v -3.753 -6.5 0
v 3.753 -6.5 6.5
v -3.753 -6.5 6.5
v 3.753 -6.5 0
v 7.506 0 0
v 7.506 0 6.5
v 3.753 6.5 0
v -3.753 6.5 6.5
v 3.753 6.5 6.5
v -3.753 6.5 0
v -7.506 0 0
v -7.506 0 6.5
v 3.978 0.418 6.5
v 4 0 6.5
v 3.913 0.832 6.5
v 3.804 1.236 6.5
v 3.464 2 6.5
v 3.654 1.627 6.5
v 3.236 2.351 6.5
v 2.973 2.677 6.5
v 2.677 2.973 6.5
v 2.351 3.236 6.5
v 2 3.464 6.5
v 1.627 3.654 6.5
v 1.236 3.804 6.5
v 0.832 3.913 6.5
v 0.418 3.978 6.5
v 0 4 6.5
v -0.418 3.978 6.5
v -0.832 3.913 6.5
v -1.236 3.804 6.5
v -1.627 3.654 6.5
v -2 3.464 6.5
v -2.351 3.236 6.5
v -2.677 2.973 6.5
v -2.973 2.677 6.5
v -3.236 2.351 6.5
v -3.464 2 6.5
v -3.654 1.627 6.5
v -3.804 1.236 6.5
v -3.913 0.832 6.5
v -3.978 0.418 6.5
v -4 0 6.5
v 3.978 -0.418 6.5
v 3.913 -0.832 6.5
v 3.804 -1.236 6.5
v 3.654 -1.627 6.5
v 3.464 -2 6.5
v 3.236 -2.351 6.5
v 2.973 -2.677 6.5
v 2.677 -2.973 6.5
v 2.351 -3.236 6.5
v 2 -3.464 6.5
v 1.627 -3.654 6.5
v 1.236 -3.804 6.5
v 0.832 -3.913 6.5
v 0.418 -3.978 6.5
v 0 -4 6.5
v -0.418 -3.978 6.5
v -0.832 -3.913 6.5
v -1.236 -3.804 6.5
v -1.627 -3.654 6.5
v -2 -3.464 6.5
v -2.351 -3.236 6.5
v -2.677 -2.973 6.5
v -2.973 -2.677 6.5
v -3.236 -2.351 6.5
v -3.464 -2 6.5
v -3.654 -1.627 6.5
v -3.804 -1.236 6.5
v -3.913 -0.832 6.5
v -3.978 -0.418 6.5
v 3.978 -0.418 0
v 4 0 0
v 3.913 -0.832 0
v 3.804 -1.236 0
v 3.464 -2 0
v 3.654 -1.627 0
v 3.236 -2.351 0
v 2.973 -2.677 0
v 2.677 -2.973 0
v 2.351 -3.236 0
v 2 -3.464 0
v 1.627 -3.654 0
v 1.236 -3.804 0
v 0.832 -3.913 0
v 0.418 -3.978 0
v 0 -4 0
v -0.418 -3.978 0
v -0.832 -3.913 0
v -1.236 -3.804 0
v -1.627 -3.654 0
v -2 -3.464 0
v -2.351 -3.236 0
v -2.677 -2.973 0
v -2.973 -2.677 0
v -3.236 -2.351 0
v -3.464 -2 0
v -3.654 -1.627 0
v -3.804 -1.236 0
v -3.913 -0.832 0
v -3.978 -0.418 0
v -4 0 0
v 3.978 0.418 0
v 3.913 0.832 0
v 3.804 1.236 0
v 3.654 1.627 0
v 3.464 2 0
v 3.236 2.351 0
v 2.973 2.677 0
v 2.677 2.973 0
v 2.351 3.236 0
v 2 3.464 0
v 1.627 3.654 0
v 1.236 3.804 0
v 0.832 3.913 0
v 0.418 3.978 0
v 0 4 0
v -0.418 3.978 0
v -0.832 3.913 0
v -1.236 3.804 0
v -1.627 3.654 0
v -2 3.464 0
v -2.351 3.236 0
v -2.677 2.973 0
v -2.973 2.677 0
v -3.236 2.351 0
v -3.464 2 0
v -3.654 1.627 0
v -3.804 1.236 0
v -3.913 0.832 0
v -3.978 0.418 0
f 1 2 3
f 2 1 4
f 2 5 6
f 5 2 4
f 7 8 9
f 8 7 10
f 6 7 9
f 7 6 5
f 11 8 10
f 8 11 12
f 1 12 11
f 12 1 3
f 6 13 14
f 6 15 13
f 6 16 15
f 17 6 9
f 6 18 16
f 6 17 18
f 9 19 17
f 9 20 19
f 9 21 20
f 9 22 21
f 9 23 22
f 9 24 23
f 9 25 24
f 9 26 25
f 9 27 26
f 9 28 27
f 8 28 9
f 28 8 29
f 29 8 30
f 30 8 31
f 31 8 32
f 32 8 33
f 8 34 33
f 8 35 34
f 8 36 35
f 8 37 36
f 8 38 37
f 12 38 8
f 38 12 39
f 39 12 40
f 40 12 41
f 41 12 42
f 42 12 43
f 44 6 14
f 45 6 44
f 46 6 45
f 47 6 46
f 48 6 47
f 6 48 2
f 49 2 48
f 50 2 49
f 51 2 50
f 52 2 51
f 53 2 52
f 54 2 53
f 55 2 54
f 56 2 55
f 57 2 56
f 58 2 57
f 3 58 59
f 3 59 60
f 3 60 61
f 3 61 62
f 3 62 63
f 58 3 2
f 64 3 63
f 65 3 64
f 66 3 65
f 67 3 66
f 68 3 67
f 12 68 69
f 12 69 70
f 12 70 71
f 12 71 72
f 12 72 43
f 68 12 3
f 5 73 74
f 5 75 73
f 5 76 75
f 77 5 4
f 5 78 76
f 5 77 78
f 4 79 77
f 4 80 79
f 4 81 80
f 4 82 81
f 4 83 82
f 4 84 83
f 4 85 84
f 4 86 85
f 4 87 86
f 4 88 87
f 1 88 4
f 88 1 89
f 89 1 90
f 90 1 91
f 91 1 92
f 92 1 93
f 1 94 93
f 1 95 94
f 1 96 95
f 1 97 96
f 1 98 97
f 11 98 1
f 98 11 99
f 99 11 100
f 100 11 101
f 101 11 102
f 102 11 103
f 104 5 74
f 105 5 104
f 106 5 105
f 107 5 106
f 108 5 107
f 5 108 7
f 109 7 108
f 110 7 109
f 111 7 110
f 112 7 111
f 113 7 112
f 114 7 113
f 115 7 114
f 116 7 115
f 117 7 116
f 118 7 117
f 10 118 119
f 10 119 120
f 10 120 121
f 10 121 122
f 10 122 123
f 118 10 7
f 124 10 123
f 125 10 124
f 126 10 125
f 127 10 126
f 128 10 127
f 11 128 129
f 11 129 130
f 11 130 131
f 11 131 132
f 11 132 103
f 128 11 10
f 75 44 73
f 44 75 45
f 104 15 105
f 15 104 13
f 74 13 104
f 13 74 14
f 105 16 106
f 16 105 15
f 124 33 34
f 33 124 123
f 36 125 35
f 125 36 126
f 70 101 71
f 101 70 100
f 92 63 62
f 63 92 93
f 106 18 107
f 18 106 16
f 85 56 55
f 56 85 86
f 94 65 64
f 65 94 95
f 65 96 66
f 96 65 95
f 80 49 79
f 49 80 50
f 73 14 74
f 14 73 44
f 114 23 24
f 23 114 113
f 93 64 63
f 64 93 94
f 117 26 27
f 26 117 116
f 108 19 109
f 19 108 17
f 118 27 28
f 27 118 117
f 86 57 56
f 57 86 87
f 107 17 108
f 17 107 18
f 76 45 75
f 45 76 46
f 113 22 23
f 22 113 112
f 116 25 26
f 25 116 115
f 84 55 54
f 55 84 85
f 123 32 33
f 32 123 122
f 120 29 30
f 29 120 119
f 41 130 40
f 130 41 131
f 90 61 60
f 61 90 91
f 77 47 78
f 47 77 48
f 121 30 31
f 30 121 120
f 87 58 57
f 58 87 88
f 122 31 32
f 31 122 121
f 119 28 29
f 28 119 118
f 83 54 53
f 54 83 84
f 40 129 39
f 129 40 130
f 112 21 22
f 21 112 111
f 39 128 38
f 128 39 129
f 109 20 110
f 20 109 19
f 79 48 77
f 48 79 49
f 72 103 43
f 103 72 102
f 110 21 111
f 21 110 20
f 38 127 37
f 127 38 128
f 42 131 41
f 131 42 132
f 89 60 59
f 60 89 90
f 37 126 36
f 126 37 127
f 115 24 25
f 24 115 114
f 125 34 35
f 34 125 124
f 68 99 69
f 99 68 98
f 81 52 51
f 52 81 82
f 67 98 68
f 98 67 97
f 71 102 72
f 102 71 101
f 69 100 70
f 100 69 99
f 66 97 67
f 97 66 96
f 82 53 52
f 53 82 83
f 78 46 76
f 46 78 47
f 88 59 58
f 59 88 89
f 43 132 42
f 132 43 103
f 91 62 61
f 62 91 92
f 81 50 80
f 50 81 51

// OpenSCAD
// file: _params.scad
// =========================================================================
// 공유 파라미터 (모든 개별 부품 파일에서 include)
// 메인 어셈블리: cup_z_x_catrage_frame_water_mic_anti_3030.scad 에서 추출
// 프레임: 600 × 420 × 700mm (3030 프로파일, Y=0 대칭)
// =========================================================================

$fn = 60;  // 부품 출력용 고해상도
GLOBAL_TOLERANCE = 0.2;

// --- [1] 하부 기성품 및 원통 파라미터 ---
X_RAIL_LEN = 290.0;
X_BLOCK_W = 30.0; X_BLOCK_L = 32.0;   // 신규 X슬라이더 블록 (폭 30mm × 길이 32mm)
X_PITCH_X = 20.0; X_PITCH_Y = 20.0;   // 체결 홀 피치 (20 × 20mm, M3 나사탭 4개)
X_RAIL_W = 30.0;  X_RAIL_H = 20.0;   // 레일 폭 30mm (레일 바닥~블록 윗면 높이 29mm 반영)
X_TOTAL_H = 29.0;                    // 레일 바닥에서 슬라이더 블록 윗면까지의 높이

MOTOR_W = 42.0;      MOTOR_PITCH = 31.0; MOTOR_HOLE_D = 3.5;    
MOTOR_BOSS_D = 22.0; MOTOR_BOSS_H = 2.0; SCREW_D = 8.0;         
MOT_BODY_L = 41.0;   SHAFT_L = 24.0;     // 실측 NEMA17 몸통 41mm / 축 돌출 24mm

CUP_ID = 99.5;  CUP_WALL = 5.0; CUP_OD = 110.0;     // 아크릴 원통 OD110/ID100
CUP_H = 180.0;   CAGE_H = 60.0;  FLOOR_H = 10.0; PISTON_H = 20.0;     

LIP_D = 30.0;    LIP_H = 5.0;    LEAK_DRAIN_D = 4.0;    
GUIDE_PIPE_D = 8.0; BUSHING_OD = 12.0; BUSHING_H = 8.0;       
DRAIN_RADIUS = 35.0; DRAIN_D = 8.0;        

Y_OFFSET = 85.0; BRKT_H = 12.0; BRKT_D = 122.0; BRKT_ID = 62.0; Z_MOUNT_PCD = 86.0;   

// --- [2] 아크릴 파이프 및 상부 카트리지 ---
ACRYL_ID = 100.0; ACRYL_T = 5.0; ACRYL_OD = ACRYL_ID + (ACRYL_T * 2);  // OD110 (아크릴집 106 재고없음 → 컵과 동일 규격)

REVOLVER_PCD = 240.0;     // 인접 카트리지 웹 9.8mm 확보 (OD110 대응, 230→240)
CARTRIDGE_OD = REVOLVER_PCD + ACRYL_OD + 8; 
TOP_PLATE_H = 15.0;       // 아크릴 15T 통판 (보스홀 단 깊이 10mm)

HUB_D = 60.0;            
SHAFT_D = 12.0;          
HUB_WALL = 4.0;          
HUB_H = 15.0;             // 아크릴 5T × 3장 적층 — 파이프 130mm 대응
POCKET_DEPTH = 5.0;
MID_HUB_Z = 63.5;          // 중단 허브 하면 Z (벨트 중심 Z=71.0mm 정렬, 풀리 상단 Z=75.0mm = 축상단-1mm)
UPPER_HUB_Z = 135.0;       // 상단 허브 하면 Z (전체 135+15=150 유지)
BOSS_OD = 35.0;
BOSS_H = 11.0;             // 보스11 + 와셔1 = 12, 리세스10 → 허브 2mm 공중

// --- [3] GT2 벨트 구동 시스템 ---
GT2_PITCH     = 2.0;
GT2_BELT_W    = 6.0;
BIG_PULLEY_TEETH = 566;
BIG_PULLEY_PD = BIG_PULLEY_TEETH * GT2_PITCH / PI;
BIG_PULLEY_OD = BIG_PULLEY_PD + 1.0;
SMALL_PULLEY_TEETH = 20;
SMALL_PULLEY_PD = SMALL_PULLEY_TEETH * GT2_PITCH / PI;
SMALL_PULLEY_OD = SMALL_PULLEY_PD + 1.0;

BELT_MOTOR_X = -300;
BELT_MOTOR_Y = -155.5;
BRKT_MOTOR_H = 25.0;
BRKT_MOTOR_W = 45.0;        // 브래킷 폭 45mm (프로파일 간섭 회피 복원)
SLOT_LEN = 10.0;
FLAG_W = 15.0;  FLAG_H = 8.0;  FLAG_T = 1.5;

X_POS_MEASURE = 170.0;   // 측정 브래킷 X좌표 (X_M~X_R 정중앙, X대칭)

// --- [4] 3030 프레임 경계 (600×430×700mm) ---
PF = 30;             // 3030 알루미늄 프로파일
WASHER_T = 1.0;     

X_L = -320;
X_M = 60;
X_R = 250;
Y_F = -210;          // 전방 (대칭: -210+30=-180, Y=0 중심)
Y_B = 180;           // 후방 (대칭: 180+30=210, Y=0 중심) — 메인파일과 동기화

Z_BOT = -480;
Z_RAIL = -322;
Z_MID = -TOP_PLATE_H - PF;
Z_TOP = 220;

SUPPORT_PILLAR_H = Z_TOP - PF;

SHAFT_SQ = 20;       // 2020 사각 회전축

// 사각 축 홀 크기
SQ = SHAFT_SQ + GLOBAL_TOLERANCE;  // 20.2mm

// --- 리볼버/컵 축 정렬 (보스홀=판 중심에 리볼버 정렬) ---
REVOLVER_CX = (X_L + X_M + PF)/2;        // 판 중심 = 보스홀 = 리볼버 회전축 (-115)
DROP_X      = REVOLVER_CX + REVOLVER_PCD/2;  // 링 드롭 / 컵 적재 축 (+5)

FLANGE_Z = 52.0;       // 모터 전면 안착 높이 (Z=52mm -> 축 상단 Z=76mm, 풀리 결합)

// --- [5] 모터 체결홀 (이미 제작 완료된 15T 상판 원본 도면 수치 100% 유지) ---
MOTOR_BOLT_PITCH     = 25.0;      // Y피치 (Y = ±12.5mm)
MOTOR_BOLT_X_NOMINAL = X_L + 55;  // 1열: 상판 좌단 55 (모터축 기준 +35mm = X=-265mm)
MOTOR_BOLT_X_SHIFT   = X_L + 40;  // 2열: 상판 좌단 40 (모터축 기준 +20mm = X=-280mm)

// 모터 마운트 볼트 카운터보어 (단볼트용 — 브래킷 두께 25 중 깊게 파냄)
MOTOR_CB_D     = 6.5;            // M3 캡볼트 머리 클리어런스
MOTOR_CB_DEPTH = 19;             // 카운터보어 깊이 (잔여 통과 6mm → M3×10 단볼트)
// main file
// =========================================================================
// [구매] M8 육각 너트 × 2
// 구매: M8 스테인리스 육각 너트 (피스톤-리드스크류 결합용)
// 피스톤 내부 너트 리세스(ø15, 육각)에 매립
// =========================================================================
include <_params.scad>

// M8 너트 규격: 대변 거리 13mm, 높이 6.5mm
NUT_AF = 13.0;   // across flats (대변 거리)
NUT_H = 6.5;     // 높이
NUT_ID = 8.0;    // 내경 (M8)

color([0.7, 0.7, 0.7]) difference() {
    // 육각 외형
    cylinder(d=NUT_AF / cos(30), h=NUT_H, $fn=6);
    // 내경 관통
    translate([0, 0, -1]) cylinder(d=NUT_ID, h=NUT_H + 2);
}
